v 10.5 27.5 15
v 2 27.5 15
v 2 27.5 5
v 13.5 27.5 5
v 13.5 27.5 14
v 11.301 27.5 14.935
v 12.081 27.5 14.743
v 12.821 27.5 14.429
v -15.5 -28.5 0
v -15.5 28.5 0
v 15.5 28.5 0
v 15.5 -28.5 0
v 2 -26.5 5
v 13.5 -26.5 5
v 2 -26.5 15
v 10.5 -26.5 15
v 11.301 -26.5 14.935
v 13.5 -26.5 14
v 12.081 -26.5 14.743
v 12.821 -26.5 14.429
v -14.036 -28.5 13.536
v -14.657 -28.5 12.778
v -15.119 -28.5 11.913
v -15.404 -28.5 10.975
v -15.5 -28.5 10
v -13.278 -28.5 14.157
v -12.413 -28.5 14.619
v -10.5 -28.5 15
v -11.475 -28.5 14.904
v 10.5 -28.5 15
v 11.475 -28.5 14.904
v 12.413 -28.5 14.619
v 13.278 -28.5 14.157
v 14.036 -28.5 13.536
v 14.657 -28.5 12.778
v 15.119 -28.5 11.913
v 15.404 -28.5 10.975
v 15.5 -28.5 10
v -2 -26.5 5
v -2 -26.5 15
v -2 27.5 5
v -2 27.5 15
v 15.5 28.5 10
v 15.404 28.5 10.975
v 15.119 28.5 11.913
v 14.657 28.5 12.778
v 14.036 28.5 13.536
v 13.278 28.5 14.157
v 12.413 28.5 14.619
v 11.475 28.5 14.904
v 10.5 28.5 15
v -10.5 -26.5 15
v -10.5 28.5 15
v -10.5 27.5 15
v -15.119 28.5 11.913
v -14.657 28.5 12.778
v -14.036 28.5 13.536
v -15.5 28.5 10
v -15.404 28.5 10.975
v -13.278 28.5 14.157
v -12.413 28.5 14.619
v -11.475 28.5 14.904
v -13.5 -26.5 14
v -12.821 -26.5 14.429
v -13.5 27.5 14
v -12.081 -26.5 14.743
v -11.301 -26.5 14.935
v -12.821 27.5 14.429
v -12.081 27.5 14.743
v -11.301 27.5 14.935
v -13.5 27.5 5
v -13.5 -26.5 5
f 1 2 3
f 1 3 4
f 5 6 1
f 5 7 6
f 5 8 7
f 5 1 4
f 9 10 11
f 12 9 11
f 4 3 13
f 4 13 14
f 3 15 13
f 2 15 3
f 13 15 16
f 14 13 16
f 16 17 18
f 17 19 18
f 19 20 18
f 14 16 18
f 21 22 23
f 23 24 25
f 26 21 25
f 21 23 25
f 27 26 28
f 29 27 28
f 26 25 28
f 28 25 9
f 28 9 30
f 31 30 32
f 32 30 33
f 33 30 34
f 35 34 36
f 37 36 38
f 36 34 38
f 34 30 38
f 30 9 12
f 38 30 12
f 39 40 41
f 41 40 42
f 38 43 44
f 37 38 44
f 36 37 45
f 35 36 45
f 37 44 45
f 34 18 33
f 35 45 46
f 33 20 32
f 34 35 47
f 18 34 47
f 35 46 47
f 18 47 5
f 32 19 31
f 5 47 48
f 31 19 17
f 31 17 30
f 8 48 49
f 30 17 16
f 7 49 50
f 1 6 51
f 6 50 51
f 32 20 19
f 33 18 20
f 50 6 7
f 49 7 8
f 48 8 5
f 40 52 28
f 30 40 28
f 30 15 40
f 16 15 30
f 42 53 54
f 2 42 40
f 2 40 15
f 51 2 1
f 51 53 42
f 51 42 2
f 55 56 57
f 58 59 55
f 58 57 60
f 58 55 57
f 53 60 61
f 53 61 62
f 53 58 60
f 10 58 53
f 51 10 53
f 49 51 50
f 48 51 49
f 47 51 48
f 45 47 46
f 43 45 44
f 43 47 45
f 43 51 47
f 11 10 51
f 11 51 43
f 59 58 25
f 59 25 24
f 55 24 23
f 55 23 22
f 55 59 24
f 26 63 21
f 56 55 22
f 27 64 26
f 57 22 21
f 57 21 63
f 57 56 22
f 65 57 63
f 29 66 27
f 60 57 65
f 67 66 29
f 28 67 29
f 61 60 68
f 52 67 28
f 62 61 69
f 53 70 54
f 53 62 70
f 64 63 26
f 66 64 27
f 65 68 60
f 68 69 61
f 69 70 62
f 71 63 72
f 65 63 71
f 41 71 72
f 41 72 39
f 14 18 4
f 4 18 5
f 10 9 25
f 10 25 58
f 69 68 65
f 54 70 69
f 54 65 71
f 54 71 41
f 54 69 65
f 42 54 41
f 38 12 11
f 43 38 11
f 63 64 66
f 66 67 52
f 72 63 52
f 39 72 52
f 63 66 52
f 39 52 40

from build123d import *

# Parameters (mm, degrees)
F0_W     = 31
F0_H     = 57
F1_DEPTH = 15
F2_R     = 5
F3_W     = 11.5
F3_H     = 54
F4_DEPTH = 10


with BuildPart() as f1:
    # F0 (on Top) → F1 (new body)
    with BuildSketch(Plane.XY):
        Rectangle(F0_W, F0_H)
    extrude(amount=F1_DEPTH)

    # F2
    f2_edges = [f1.edges().sort_by_distance(p)[0] for p in [
        (15.5, 0, 15),
        (-15.5, 0, 15),
    ]]
    fillet(f2_edges, radius=F2_R)

    # F3 (on face) → F4 (cut)
    with BuildSketch(Plane.XY.offset(15)):
        with Locations((7.75, 0.5)):
            Rectangle(F3_W, F3_H)
        with Locations((-7.75, 0.5)):
            Rectangle(F3_W, F3_H)
    extrude(amount=-F4_DEPTH, mode=Mode.SUBTRACT)


solid = f1.part
